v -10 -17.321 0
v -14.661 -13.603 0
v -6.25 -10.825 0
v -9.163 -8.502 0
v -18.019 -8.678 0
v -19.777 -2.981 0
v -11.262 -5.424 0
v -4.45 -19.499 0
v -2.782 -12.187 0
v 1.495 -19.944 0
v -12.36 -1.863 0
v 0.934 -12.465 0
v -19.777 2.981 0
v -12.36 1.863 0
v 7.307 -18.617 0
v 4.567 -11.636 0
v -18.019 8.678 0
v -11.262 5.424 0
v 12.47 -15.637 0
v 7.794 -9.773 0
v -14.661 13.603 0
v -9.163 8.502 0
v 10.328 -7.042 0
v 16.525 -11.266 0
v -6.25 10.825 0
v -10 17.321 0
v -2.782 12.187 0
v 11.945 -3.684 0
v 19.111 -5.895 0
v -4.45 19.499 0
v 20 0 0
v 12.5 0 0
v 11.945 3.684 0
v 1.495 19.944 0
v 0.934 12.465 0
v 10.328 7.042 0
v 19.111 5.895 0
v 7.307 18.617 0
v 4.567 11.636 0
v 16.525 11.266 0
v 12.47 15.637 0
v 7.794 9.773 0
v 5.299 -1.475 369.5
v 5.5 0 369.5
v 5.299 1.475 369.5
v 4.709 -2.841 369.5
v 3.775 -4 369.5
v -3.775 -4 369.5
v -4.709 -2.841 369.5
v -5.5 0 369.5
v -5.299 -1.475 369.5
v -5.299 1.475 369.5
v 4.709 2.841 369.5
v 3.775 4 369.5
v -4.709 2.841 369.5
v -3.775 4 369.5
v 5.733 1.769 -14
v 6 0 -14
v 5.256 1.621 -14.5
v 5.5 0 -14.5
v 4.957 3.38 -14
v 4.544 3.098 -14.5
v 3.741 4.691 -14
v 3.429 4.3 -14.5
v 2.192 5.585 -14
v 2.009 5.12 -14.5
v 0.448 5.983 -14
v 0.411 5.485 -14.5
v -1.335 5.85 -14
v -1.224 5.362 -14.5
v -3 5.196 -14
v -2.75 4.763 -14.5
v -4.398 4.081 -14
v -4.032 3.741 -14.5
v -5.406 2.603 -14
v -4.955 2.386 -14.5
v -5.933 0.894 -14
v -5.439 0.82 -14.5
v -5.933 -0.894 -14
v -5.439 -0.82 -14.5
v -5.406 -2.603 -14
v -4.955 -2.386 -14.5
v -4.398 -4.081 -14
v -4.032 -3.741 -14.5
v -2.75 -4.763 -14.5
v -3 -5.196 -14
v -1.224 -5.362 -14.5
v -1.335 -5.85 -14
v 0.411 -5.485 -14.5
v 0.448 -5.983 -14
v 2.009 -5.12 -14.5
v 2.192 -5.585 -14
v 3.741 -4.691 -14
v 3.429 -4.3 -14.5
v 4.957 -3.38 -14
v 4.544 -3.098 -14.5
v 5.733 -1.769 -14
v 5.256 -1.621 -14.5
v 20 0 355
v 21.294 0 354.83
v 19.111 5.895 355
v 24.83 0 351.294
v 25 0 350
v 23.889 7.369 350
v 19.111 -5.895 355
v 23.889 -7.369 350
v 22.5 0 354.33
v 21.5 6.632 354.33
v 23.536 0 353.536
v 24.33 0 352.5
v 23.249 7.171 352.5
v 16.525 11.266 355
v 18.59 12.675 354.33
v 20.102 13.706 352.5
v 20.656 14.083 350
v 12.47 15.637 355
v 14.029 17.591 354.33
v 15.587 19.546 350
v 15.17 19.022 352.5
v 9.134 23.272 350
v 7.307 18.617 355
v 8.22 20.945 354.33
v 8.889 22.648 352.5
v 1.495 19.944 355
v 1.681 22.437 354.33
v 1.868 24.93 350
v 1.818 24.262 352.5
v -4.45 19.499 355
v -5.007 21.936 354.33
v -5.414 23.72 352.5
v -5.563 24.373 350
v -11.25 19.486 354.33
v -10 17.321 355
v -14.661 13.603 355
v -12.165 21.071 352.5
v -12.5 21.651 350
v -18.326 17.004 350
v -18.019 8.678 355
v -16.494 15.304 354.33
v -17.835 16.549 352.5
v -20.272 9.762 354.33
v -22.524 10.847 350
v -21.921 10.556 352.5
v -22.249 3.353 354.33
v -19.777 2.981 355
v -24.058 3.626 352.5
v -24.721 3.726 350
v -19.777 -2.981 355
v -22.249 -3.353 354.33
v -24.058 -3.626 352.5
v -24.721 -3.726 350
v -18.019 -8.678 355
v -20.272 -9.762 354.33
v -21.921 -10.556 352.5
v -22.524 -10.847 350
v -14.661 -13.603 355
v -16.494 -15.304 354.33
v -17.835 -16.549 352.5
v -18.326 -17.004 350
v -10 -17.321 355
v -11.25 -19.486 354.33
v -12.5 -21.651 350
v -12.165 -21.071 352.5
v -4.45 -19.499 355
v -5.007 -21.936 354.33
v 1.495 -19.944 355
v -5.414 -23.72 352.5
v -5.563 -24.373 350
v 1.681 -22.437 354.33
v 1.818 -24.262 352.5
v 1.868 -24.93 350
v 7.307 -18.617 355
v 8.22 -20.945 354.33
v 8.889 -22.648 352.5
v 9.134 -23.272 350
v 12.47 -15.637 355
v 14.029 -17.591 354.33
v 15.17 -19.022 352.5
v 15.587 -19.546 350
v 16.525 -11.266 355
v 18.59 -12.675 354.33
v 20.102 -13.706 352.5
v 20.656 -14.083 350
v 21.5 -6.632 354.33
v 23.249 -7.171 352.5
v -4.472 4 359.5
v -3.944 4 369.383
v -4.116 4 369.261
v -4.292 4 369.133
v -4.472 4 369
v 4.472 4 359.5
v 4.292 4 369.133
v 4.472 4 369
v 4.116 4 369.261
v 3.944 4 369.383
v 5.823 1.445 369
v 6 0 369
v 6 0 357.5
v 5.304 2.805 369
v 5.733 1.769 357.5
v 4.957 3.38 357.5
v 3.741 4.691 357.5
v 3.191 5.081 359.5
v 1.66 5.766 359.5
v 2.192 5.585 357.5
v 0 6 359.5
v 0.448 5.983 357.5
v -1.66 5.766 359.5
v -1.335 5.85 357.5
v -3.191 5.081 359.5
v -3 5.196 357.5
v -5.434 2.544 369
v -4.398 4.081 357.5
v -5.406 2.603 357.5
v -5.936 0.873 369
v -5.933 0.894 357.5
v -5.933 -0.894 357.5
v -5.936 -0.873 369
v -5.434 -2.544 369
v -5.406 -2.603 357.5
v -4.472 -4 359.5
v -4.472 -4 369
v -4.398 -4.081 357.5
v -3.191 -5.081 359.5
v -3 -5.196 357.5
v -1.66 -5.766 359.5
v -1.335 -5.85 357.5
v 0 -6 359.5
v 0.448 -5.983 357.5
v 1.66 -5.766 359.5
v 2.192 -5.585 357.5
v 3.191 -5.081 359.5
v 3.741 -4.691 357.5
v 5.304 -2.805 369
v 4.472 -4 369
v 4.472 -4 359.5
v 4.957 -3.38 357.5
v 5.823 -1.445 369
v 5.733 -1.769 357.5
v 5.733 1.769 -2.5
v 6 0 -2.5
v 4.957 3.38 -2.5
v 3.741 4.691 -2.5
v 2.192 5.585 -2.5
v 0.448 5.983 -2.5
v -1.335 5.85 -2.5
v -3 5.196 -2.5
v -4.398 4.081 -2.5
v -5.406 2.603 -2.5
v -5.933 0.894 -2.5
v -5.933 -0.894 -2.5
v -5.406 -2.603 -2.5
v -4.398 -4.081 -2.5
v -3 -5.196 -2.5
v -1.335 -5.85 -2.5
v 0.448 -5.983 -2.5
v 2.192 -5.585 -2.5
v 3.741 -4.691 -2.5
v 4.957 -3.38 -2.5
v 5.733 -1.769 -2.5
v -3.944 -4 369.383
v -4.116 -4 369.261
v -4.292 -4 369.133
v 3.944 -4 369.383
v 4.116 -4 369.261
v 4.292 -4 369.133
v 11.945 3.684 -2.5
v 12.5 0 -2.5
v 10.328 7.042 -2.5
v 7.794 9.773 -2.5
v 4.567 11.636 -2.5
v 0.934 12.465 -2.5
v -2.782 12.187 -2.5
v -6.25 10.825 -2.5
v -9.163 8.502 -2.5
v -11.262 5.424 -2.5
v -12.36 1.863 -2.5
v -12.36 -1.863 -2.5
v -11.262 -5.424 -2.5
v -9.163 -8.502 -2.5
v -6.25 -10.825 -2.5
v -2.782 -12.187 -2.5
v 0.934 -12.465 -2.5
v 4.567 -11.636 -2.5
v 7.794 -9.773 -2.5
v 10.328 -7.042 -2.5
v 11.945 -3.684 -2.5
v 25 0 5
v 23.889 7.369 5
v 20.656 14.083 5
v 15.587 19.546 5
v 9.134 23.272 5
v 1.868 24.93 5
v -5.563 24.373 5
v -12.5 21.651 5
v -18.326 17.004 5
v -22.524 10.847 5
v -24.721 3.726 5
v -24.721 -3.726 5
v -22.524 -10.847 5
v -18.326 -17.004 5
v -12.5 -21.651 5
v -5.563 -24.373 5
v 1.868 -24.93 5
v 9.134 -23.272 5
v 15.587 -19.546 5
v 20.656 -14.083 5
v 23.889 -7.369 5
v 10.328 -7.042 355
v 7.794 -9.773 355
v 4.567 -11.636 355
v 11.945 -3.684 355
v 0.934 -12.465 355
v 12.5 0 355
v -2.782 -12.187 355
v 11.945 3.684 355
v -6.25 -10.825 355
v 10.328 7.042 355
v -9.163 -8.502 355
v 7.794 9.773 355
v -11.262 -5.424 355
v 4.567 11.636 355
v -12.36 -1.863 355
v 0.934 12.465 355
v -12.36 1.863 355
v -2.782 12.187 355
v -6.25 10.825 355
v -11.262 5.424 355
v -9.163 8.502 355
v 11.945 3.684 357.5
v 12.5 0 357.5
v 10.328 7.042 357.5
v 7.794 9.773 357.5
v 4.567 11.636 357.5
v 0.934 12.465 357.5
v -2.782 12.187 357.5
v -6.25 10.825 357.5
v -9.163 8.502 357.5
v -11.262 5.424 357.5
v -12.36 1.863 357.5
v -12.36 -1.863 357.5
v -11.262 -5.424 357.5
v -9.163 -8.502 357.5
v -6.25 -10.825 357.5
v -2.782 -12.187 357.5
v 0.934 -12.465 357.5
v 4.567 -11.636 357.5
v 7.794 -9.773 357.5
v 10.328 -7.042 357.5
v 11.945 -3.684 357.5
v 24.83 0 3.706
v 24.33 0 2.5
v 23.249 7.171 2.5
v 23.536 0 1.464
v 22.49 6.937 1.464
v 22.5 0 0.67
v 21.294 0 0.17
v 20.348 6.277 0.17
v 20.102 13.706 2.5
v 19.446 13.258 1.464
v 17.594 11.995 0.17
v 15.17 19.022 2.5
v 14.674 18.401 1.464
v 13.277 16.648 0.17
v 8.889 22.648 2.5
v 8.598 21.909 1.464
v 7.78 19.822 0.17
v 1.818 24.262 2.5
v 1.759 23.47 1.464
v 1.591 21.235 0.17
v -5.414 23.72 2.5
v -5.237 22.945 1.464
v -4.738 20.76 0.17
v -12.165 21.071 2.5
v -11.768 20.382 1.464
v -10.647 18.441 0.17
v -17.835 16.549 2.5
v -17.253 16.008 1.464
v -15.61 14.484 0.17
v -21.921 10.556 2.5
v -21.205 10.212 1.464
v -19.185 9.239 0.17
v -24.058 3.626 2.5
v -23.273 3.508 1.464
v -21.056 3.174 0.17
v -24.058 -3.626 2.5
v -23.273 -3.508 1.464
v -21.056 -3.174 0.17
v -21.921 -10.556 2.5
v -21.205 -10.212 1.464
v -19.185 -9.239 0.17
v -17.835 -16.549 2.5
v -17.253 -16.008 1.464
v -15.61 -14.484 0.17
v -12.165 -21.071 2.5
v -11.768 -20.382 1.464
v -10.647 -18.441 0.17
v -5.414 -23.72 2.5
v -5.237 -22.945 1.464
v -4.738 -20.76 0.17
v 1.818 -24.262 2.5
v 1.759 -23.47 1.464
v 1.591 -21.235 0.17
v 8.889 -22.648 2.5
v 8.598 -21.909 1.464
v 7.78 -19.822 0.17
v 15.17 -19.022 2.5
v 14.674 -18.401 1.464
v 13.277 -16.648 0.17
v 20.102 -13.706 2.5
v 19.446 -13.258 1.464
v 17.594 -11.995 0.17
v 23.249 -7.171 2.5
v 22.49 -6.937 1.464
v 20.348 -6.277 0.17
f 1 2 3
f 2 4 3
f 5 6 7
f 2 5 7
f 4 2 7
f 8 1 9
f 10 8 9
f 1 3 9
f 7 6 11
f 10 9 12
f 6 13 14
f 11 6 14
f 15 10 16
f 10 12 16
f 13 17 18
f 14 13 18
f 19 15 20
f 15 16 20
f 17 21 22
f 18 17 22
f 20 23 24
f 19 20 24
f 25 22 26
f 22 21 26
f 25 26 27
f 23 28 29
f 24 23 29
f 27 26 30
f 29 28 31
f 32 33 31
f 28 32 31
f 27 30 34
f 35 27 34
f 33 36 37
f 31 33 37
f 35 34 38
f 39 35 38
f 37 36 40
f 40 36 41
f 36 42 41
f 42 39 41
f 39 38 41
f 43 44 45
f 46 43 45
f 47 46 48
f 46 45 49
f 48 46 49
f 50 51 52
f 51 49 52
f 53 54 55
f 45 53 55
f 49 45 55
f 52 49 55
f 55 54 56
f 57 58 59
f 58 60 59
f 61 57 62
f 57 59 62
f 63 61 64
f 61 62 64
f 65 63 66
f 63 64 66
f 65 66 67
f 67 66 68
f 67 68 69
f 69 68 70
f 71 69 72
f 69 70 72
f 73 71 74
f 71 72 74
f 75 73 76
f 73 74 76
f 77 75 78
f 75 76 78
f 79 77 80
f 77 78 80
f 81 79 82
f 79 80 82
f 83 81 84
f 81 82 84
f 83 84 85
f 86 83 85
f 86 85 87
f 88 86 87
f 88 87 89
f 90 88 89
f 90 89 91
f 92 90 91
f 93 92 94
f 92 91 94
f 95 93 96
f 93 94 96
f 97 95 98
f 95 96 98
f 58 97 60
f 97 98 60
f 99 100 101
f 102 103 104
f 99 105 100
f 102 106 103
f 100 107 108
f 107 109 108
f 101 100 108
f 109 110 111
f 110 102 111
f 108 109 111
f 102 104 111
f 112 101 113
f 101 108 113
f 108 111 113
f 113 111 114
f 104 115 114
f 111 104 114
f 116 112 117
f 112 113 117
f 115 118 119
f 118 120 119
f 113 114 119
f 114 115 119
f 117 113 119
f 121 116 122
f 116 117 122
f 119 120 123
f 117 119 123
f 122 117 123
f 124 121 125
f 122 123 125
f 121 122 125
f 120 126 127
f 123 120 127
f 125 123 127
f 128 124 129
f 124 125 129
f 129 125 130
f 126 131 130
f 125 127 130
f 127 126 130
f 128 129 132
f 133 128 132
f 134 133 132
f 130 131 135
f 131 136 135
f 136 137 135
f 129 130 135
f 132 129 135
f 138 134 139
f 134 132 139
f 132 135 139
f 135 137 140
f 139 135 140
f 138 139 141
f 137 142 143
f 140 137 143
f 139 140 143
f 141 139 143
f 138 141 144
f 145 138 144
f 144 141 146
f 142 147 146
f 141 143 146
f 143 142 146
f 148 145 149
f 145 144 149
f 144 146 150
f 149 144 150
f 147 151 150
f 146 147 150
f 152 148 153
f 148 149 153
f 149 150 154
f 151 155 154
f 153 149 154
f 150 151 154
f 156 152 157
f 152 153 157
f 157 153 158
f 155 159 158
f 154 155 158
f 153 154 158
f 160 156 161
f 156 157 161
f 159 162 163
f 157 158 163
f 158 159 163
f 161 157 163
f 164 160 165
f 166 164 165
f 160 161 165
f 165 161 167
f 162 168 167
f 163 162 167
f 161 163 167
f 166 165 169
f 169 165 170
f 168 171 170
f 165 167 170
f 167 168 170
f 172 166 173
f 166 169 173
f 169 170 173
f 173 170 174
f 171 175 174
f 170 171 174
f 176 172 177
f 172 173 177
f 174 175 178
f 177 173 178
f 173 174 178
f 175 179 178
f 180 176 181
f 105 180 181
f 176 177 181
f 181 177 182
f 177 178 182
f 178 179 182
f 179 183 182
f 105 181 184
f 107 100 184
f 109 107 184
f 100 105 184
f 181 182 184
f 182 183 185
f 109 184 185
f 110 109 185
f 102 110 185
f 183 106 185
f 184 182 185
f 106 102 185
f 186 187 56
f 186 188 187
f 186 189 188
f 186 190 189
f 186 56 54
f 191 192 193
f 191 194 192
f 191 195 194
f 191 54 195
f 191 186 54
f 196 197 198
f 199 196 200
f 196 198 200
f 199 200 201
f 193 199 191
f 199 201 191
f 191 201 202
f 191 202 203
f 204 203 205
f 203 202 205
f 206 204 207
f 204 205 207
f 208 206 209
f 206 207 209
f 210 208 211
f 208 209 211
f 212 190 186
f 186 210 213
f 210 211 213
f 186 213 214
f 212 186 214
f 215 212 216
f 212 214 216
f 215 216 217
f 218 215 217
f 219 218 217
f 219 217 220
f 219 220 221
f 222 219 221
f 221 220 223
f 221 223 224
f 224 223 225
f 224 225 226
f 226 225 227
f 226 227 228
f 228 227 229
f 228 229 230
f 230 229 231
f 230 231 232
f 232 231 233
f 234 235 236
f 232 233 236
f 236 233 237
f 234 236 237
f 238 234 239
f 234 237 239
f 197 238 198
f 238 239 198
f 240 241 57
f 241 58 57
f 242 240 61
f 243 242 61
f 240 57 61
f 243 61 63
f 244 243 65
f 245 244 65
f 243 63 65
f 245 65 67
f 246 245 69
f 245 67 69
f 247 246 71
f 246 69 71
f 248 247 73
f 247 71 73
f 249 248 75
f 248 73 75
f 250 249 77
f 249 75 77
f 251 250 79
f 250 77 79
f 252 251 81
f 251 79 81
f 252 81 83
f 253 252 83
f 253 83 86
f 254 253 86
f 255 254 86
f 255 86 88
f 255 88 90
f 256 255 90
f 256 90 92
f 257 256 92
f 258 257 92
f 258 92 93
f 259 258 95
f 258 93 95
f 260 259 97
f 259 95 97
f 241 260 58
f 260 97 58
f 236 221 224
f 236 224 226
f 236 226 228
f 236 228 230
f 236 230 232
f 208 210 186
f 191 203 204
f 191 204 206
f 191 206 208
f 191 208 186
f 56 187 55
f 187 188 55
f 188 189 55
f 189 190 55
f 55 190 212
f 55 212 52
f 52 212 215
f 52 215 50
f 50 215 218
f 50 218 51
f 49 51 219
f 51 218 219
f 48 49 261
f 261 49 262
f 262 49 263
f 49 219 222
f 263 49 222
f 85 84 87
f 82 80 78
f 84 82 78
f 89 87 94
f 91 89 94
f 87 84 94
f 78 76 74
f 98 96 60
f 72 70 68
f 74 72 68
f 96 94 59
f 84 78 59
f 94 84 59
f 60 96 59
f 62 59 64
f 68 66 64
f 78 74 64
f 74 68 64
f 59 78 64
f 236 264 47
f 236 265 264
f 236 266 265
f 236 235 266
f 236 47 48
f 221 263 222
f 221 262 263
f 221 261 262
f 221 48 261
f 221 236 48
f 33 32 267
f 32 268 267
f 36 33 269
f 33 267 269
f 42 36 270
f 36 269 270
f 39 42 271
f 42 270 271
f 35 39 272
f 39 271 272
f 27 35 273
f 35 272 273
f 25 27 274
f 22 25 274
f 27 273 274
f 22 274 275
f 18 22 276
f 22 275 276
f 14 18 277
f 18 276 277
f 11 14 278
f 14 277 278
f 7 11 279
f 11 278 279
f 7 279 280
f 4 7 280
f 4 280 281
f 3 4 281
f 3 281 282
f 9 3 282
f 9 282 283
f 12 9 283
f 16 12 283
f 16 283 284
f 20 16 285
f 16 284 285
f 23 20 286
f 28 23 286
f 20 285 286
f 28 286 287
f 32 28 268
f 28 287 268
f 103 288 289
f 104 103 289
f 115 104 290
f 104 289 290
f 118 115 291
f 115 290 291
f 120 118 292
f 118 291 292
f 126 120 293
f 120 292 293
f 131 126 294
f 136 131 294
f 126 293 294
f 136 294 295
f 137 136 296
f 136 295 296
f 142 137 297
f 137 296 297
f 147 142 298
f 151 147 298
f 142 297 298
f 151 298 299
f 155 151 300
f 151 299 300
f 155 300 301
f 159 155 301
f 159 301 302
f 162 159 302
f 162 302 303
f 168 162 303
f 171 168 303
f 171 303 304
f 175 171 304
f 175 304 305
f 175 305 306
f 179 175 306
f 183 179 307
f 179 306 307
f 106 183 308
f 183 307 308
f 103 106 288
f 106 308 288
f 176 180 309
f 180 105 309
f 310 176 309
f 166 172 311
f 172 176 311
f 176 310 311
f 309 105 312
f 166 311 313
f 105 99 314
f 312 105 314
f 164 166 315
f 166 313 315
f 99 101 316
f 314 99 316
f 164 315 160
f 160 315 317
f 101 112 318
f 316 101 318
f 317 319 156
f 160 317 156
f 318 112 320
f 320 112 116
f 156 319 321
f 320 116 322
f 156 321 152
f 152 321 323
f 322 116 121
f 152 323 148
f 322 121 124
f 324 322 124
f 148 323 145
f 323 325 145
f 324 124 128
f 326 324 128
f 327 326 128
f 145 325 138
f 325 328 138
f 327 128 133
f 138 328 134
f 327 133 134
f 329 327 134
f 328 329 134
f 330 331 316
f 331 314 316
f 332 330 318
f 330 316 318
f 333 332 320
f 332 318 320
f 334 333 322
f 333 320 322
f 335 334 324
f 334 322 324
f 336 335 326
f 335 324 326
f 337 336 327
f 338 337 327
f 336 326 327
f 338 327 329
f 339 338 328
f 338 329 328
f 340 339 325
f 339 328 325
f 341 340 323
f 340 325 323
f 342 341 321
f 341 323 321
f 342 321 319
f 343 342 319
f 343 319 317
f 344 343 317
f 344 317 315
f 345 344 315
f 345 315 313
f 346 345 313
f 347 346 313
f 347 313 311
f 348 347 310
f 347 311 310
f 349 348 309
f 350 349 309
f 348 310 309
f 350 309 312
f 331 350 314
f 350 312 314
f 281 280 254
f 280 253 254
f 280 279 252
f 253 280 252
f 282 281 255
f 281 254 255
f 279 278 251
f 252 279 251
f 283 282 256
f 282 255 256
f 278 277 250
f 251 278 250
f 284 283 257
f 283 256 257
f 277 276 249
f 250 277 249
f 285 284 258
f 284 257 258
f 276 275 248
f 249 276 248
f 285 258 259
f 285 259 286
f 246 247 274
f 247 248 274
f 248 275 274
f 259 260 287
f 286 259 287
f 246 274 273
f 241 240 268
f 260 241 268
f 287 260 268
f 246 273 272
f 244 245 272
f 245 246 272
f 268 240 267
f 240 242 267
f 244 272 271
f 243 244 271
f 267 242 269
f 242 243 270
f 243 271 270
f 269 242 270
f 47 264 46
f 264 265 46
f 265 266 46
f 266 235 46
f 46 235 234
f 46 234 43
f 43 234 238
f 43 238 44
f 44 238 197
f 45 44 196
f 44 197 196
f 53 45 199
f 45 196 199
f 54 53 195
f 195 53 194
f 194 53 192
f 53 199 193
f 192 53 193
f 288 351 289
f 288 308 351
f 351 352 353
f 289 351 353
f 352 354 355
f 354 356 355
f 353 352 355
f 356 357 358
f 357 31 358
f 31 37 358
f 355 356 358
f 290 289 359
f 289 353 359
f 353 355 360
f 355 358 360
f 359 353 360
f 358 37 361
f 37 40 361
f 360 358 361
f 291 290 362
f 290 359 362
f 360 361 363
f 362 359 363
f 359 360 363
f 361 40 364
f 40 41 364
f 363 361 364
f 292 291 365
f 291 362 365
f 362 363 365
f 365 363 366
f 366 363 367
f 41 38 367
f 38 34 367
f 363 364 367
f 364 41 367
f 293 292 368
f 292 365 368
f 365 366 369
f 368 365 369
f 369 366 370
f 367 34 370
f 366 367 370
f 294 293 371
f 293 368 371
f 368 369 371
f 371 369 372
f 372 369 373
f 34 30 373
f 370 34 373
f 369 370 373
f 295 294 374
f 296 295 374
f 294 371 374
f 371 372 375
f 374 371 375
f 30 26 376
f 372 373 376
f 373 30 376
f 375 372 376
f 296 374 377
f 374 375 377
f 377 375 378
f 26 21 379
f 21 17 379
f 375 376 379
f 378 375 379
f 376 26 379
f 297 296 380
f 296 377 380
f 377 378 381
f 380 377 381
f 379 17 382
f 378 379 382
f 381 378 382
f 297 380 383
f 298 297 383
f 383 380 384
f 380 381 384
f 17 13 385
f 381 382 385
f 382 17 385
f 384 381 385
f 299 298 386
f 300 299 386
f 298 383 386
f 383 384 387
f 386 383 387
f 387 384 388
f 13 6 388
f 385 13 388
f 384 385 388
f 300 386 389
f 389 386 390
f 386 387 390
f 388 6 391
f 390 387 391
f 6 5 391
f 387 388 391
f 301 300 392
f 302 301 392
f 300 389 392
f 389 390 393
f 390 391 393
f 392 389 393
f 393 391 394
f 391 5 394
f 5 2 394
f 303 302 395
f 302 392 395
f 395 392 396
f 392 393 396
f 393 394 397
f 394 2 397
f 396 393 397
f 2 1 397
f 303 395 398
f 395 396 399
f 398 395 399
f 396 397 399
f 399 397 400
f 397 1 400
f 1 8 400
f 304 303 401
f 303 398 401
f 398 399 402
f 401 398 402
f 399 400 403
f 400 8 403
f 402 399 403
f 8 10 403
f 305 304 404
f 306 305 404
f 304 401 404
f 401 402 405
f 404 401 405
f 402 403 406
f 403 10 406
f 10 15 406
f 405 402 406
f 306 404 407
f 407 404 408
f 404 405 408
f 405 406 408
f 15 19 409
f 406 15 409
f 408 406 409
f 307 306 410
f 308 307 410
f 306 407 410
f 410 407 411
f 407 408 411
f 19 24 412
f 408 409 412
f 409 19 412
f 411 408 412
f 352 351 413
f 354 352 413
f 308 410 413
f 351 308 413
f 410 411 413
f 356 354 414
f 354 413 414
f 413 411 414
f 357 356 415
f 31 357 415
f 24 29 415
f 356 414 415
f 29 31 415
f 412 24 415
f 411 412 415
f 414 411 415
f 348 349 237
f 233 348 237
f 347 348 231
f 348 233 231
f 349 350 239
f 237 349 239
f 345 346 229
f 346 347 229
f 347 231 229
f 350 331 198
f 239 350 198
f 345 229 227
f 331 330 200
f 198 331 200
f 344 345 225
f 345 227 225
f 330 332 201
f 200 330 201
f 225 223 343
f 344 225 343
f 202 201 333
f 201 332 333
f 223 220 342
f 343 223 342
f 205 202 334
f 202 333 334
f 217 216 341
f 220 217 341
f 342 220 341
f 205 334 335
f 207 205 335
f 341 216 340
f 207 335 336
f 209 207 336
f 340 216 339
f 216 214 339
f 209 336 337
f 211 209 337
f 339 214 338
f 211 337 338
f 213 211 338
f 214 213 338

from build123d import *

# Parameters (mm, degrees)
FILLET1_R          = 5
CUT_EXTRUDE1_START = -10
CUT_EXTRUDE1_DEPTH = 10


with BuildPart() as part:
    # Sketch1 → Revolve1 (revolve)
    with BuildSketch(Plane(origin=(0, 0, 0), x_dir=(1, 0, 0), z_dir=(0, 1, 0))):
        Polygon((5.5, 14.5), (0, 14.5), (0, -369.5), (5.5, -369.5), (6, -369), (6, -357.5), (12.5, -357.5), (12.5, -355), (25, -355), (25, 0), (12.5, 0), (12.5, 2.5), (6, 2.5), (6, 14), align=None)
    revolve(axis=Axis((0, 0, -14.5), (0, 0, 1)))

    # Fillet1
    fillet1_edges = [part.edges().sort_by_distance(p)[0] for p in [
        (-25, 0, 355),
        (-25, 0, 0),
    ]]
    fillet(fillet1_edges, radius=FILLET1_R)

    # Sketch2 → Cut-Extrude1 (cut)
    with BuildSketch(Plane.XY.offset(369.5).offset(CUT_EXTRUDE1_START)):
        with BuildLine():
            ThreePointArc((4.472135955, 4), (0, 6), (-4.472135955, 4))
            Line((-4.472135955, 4), (4.472135955, 4))
        make_face()
        with BuildLine():
            Line((4.472135955, -4), (-4.472135955, -4))
            ThreePointArc((-4.472135955, -4), (0, -6), (4.472135955, -4))
        make_face()
    extrude(amount=CUT_EXTRUDE1_DEPTH, mode=Mode.SUBTRACT)


solid = part.part
